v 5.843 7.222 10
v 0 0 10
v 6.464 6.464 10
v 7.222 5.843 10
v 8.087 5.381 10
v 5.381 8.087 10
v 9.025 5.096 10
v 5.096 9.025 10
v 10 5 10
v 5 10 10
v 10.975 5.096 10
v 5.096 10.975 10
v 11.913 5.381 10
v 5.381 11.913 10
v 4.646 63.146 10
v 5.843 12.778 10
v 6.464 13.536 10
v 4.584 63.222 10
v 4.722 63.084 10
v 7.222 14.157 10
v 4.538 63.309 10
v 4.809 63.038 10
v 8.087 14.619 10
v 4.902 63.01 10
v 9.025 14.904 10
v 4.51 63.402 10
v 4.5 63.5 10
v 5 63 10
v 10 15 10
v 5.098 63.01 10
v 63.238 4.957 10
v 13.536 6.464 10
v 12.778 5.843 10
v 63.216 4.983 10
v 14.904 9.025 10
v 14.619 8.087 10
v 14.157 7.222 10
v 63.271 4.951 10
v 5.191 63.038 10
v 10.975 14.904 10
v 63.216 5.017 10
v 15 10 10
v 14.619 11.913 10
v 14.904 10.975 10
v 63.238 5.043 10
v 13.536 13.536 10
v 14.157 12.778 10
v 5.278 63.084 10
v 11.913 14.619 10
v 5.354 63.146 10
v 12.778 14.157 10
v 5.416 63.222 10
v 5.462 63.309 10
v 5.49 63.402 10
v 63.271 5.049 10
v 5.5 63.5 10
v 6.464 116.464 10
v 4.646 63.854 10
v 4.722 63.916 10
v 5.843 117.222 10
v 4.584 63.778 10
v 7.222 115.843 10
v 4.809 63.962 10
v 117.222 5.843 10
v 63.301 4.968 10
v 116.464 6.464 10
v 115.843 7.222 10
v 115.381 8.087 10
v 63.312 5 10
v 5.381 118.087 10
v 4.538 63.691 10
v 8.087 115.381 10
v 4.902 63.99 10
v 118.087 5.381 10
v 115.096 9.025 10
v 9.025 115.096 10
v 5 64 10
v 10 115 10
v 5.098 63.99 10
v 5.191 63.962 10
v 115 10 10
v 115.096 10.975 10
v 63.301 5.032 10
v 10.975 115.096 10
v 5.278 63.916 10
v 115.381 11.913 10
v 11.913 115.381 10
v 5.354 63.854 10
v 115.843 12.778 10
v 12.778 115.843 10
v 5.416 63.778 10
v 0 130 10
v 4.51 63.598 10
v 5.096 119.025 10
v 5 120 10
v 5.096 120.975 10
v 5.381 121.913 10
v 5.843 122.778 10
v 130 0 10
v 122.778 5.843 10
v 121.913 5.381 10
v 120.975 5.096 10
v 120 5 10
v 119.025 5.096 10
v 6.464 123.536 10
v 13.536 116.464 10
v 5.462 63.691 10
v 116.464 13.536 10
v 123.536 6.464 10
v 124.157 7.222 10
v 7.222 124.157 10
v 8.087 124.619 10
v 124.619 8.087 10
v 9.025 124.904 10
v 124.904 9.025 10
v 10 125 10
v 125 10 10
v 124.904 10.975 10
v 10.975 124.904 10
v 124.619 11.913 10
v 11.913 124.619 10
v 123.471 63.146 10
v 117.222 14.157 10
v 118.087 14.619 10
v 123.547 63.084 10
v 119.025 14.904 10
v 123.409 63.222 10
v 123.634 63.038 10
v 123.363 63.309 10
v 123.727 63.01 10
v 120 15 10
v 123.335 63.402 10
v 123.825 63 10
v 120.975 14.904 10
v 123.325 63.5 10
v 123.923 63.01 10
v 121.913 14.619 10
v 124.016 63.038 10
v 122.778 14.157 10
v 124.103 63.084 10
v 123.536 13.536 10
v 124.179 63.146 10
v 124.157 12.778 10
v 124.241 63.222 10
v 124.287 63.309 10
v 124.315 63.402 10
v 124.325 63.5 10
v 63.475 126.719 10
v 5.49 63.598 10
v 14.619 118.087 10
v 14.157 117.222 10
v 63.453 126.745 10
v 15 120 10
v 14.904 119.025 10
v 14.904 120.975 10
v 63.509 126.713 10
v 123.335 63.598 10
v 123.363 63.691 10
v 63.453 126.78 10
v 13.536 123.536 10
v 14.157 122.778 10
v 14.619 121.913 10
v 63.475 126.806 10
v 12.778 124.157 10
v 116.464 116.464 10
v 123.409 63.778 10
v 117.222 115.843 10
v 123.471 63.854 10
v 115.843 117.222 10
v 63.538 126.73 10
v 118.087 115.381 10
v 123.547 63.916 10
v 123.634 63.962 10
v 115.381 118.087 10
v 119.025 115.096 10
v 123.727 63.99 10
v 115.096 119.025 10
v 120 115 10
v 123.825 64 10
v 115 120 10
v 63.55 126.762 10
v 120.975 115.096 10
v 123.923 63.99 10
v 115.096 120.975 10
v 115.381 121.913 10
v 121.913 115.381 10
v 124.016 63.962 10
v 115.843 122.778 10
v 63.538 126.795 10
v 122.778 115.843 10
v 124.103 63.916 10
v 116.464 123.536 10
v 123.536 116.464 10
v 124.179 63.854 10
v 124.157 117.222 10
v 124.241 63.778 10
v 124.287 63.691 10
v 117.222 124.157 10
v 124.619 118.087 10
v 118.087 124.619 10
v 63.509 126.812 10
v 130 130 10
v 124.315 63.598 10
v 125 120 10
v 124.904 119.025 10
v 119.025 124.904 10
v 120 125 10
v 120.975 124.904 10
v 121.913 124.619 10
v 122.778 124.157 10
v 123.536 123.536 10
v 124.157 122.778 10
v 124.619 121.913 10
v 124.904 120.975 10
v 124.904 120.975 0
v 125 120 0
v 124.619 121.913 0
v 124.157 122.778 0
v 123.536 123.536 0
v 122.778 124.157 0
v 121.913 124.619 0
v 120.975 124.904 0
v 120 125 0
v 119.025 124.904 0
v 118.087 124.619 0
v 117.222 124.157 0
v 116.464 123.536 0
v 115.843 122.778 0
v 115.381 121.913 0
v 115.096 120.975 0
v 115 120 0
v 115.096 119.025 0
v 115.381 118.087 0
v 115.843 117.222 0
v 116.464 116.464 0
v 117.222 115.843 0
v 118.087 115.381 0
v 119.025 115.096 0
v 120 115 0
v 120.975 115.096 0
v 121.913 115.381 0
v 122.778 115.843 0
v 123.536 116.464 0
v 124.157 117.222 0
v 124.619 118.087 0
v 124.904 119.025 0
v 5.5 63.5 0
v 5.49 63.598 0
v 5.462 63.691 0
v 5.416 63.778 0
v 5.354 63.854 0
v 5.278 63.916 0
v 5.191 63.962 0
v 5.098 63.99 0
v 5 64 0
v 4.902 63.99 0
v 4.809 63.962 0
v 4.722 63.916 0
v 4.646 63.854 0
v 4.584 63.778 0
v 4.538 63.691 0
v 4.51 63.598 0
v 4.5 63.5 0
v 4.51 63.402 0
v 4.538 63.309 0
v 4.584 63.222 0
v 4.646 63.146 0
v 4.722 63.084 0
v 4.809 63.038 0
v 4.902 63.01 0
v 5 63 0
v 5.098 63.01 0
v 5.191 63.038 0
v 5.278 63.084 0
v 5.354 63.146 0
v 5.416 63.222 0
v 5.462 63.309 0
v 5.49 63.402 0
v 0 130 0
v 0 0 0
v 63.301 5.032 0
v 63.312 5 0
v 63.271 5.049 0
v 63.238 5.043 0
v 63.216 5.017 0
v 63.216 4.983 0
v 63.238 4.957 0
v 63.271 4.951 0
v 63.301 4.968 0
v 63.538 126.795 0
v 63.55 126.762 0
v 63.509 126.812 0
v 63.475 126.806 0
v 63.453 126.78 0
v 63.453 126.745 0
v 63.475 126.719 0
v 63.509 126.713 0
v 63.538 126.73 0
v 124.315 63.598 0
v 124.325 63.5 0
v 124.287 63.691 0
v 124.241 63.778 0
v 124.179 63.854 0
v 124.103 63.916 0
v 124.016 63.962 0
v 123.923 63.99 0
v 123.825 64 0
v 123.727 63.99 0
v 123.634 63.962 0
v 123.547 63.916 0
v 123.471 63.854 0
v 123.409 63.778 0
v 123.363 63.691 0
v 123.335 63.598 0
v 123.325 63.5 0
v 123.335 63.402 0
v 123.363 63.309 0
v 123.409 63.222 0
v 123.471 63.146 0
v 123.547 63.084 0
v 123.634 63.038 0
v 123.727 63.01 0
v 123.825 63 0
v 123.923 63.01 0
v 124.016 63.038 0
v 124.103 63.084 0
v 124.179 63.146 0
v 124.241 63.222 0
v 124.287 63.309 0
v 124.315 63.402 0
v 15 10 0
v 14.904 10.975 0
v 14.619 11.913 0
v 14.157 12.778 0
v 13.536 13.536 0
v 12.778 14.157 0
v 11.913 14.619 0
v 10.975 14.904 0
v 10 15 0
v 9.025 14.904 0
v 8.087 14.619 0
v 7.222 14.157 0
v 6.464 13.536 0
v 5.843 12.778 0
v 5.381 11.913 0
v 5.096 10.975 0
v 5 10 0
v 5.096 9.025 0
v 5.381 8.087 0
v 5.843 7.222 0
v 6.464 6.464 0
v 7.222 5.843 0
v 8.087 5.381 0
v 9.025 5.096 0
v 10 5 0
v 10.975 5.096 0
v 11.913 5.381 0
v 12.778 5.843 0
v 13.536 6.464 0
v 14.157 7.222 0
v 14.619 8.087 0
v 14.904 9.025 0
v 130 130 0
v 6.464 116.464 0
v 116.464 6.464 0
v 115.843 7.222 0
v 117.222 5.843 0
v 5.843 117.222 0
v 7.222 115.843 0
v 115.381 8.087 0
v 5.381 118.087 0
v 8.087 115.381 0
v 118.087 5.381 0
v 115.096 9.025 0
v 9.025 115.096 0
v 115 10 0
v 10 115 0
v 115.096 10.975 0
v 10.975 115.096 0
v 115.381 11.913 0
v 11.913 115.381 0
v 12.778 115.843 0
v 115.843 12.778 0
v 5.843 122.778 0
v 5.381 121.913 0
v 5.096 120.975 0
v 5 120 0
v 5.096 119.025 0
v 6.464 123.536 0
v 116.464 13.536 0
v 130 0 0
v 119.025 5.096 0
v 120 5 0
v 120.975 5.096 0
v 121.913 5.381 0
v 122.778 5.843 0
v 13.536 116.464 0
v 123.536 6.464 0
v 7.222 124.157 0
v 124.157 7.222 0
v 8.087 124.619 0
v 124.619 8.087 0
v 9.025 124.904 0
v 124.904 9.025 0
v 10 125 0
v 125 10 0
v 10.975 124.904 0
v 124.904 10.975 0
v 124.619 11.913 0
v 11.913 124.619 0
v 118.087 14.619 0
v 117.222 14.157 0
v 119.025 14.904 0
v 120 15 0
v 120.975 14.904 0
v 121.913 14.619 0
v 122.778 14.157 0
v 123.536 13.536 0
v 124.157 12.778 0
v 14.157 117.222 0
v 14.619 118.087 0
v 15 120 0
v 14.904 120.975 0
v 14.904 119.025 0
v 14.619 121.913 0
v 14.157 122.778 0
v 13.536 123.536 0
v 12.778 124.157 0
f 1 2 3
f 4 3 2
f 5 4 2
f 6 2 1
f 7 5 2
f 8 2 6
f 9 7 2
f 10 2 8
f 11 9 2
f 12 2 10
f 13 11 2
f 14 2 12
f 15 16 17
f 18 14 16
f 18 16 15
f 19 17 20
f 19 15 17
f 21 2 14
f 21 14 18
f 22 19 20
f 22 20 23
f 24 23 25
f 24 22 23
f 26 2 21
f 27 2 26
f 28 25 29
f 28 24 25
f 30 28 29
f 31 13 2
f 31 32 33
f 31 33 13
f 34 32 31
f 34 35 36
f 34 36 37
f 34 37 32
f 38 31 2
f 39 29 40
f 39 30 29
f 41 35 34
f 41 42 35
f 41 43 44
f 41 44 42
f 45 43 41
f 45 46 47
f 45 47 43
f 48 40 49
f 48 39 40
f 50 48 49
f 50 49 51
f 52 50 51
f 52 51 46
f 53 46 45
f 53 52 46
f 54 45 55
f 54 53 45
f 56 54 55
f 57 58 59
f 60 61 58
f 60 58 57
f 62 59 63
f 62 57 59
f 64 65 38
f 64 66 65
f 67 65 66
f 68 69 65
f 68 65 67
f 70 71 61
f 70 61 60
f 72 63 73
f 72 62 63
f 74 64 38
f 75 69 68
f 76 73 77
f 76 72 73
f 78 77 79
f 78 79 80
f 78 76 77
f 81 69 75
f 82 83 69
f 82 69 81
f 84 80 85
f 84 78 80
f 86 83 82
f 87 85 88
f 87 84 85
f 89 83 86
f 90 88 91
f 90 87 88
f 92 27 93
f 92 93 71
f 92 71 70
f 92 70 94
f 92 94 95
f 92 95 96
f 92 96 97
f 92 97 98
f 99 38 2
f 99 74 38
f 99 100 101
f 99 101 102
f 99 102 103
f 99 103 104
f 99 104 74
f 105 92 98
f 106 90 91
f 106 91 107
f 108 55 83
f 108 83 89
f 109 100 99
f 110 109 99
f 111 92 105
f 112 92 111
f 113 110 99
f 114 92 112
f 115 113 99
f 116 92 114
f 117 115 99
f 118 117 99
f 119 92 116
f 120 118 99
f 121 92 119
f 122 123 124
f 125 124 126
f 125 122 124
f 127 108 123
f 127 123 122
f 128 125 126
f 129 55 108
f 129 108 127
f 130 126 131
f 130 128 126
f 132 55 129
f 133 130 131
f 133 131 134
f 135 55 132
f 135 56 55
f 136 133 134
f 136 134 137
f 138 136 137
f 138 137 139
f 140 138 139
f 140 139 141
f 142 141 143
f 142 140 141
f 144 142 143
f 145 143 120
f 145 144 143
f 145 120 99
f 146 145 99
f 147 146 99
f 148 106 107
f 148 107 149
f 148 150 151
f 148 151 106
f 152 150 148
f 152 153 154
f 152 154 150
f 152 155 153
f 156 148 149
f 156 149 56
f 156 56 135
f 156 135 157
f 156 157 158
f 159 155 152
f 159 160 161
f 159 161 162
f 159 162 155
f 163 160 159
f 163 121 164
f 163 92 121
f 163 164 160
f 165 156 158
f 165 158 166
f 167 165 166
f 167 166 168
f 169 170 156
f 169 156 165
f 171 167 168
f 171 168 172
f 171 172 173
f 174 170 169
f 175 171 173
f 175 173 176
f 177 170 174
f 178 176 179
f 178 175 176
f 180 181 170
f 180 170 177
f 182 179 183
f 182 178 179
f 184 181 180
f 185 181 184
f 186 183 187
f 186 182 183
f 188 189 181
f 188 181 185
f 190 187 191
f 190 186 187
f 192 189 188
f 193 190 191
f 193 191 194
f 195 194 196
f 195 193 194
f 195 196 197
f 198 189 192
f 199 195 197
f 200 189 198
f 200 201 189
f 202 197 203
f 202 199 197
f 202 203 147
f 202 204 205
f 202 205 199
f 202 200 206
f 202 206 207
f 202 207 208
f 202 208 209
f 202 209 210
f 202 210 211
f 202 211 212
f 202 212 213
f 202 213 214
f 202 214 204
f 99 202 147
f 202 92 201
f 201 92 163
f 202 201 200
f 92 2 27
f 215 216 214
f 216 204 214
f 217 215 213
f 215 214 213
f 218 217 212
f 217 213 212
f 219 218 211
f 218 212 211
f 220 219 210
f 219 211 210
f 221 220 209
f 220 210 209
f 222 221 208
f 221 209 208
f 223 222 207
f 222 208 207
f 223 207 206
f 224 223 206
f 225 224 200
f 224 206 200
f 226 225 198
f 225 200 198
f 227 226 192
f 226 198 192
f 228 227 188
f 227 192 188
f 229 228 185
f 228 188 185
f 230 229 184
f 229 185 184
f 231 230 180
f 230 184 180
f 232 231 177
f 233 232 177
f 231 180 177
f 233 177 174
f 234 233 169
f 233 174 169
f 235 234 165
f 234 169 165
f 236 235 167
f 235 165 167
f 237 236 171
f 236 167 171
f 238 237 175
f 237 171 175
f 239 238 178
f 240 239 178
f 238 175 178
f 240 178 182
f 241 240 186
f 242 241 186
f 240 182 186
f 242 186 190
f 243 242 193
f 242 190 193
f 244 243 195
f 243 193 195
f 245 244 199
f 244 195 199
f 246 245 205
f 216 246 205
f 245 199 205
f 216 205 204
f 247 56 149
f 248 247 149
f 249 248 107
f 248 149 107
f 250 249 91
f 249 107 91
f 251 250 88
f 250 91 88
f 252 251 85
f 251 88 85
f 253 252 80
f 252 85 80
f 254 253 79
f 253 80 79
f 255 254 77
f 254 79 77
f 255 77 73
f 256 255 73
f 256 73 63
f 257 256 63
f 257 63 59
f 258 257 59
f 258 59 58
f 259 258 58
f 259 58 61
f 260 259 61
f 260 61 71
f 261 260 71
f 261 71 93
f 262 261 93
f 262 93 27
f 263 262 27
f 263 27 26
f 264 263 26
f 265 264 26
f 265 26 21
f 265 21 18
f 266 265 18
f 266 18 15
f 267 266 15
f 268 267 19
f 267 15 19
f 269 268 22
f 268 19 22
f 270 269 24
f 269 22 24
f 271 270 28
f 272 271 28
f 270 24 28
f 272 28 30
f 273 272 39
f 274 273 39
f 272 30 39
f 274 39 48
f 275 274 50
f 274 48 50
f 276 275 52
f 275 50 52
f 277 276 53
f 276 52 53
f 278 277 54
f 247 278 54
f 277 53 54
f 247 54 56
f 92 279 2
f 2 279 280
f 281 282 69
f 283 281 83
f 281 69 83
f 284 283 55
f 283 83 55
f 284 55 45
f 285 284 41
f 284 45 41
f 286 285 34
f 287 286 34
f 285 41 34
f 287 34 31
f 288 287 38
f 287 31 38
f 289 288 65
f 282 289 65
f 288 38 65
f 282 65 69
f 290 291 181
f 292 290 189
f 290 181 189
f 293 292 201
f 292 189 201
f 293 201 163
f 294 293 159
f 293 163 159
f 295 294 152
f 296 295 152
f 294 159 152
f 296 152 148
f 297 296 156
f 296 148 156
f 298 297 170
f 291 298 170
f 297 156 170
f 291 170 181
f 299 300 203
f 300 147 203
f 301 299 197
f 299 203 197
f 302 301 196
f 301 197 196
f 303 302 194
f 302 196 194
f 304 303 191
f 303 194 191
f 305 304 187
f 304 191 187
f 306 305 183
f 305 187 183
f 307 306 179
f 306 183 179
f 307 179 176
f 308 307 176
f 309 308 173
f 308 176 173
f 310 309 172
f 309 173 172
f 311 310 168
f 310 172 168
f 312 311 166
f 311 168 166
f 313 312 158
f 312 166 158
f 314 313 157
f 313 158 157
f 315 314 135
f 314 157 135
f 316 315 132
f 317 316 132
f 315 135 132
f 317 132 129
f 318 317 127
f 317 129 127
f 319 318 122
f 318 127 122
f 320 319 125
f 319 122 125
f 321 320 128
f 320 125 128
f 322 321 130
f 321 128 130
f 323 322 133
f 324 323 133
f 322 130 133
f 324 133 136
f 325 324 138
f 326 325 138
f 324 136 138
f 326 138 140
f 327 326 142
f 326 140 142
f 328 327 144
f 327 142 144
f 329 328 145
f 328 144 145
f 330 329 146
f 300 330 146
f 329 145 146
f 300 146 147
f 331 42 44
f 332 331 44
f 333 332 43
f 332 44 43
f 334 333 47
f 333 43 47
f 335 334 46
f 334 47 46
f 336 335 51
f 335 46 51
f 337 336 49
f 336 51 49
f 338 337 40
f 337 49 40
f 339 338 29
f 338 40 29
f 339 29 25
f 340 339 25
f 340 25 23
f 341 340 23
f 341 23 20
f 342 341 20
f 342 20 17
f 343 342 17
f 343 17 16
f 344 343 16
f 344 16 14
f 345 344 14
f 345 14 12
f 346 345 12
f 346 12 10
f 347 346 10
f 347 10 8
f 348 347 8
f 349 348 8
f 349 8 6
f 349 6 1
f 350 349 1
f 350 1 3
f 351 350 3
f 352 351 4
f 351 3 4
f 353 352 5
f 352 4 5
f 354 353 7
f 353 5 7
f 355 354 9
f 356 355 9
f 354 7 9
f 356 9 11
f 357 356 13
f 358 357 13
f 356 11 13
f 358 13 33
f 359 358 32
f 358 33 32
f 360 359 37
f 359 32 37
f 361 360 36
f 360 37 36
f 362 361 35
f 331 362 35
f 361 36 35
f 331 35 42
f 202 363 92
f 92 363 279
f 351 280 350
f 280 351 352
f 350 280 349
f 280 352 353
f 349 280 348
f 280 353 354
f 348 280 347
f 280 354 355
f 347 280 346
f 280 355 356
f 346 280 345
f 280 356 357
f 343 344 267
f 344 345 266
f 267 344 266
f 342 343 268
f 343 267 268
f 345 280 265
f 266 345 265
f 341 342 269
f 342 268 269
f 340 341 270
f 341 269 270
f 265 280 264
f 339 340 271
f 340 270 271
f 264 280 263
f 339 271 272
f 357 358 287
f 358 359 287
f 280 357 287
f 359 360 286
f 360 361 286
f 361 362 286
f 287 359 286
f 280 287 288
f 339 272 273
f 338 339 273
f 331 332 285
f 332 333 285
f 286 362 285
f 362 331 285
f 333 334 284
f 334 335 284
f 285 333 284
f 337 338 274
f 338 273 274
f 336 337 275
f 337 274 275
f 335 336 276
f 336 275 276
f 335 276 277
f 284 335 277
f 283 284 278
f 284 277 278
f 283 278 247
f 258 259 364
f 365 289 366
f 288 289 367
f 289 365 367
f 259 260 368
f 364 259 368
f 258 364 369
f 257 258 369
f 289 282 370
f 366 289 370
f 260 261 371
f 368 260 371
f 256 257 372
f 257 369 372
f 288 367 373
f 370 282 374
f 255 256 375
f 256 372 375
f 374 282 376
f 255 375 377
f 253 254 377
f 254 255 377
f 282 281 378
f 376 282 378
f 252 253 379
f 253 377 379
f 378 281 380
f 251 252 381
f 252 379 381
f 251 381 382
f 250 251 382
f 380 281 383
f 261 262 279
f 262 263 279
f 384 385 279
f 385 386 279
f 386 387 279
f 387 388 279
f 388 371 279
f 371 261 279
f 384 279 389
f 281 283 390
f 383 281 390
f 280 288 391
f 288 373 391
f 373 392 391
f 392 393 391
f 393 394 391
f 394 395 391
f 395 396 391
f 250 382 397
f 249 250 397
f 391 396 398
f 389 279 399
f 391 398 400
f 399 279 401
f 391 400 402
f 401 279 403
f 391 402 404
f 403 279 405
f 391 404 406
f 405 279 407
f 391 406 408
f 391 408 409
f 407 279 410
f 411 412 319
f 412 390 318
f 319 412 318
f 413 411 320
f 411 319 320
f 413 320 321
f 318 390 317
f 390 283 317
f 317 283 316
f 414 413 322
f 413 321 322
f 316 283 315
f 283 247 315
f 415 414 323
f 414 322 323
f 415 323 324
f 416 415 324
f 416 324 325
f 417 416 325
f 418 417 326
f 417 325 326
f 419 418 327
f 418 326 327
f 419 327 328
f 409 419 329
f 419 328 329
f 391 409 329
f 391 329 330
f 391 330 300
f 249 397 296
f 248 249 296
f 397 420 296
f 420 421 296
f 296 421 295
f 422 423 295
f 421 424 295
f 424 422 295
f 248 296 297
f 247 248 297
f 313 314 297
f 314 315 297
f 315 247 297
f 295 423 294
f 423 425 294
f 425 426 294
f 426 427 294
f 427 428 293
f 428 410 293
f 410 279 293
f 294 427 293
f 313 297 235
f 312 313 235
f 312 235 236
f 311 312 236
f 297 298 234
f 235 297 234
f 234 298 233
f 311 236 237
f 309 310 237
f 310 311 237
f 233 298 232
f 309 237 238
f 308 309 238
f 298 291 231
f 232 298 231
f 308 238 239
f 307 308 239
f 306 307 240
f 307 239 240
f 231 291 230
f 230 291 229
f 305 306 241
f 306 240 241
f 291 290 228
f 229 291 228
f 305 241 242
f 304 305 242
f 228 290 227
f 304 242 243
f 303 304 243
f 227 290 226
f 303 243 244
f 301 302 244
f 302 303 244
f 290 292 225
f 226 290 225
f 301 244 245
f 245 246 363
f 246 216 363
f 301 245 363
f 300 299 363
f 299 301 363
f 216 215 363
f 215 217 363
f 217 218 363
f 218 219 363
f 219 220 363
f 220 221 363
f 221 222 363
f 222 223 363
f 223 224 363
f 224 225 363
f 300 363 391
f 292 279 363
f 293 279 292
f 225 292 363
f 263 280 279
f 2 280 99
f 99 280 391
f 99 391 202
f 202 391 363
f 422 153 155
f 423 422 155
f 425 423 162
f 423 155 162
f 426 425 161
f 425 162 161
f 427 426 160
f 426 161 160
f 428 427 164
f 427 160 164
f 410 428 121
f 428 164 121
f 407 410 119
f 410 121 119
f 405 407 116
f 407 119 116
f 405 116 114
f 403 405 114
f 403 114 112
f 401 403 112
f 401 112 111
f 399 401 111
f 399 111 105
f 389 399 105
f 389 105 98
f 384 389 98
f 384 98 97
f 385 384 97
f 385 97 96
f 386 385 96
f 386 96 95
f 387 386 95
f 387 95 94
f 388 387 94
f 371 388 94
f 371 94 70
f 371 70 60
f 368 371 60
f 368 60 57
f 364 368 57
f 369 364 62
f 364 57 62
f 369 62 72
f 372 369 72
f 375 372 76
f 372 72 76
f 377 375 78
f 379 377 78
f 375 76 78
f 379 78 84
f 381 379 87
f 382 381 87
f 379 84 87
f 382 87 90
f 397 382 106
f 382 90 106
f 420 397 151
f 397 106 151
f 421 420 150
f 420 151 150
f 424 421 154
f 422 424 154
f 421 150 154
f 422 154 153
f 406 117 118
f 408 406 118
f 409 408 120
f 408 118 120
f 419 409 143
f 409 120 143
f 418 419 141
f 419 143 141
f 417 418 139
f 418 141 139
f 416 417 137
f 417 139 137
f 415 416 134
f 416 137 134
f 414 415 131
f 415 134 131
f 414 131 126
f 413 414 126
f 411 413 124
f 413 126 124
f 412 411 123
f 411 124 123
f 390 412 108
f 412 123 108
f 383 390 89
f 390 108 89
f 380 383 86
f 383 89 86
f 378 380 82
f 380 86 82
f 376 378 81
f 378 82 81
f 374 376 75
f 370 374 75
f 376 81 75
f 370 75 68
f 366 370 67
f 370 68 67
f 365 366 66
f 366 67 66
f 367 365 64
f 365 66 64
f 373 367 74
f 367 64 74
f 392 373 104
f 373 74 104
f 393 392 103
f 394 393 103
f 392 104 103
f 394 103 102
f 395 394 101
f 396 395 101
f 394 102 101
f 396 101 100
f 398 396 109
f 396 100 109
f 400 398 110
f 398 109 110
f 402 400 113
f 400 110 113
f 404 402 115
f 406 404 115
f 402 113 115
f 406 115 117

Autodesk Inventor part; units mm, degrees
ref_plane "YZ Plane" through (0, 0, 0) normal (1, 0, 0) x (0, 1, 0)
ref_plane "XZ Plane" through (0, 0, 0) normal (0, 1, 0) x (-1, 0, 0)
ref_plane "XY Plane" through (0, 0, 0) normal (0, 0, 1) x (1, 0, 0)
sketch "Sketch1" plane through (0, 0, 0) normal (0, 0, 1) x (1, 0, 0)
  line L0 (0, 0) -> (130, 0)
  line L1 (130, 0) -> (130, 130)
  line L2 (130, 130) -> (0, 130)
  line L3 (0, 130) -> (0, 0)
  dimension "d0" = 130
  dimension "d1" = 130
extrude "Extrusion1" add sketch "Sketch1" along normal blind 10
sketch "Sketch2" plane through (0, 0, 10) normal (0, 0, 1) x (1, 0, 0)
  line L0 (0, 0) -> (130, 0) projected
  line L1 (0, 0) -> (10, 0)
  line L2 (10, 0) -> (10, 110)
  line L3 (10, 110) -> (10, 120)
  line L4 (10, 120) -> (120, 120)
  line L5 (120, 120) -> (120, 10)
  line L6 (120, 10) -> (10, 10)
  circle A0 centre (10, 120) radius 5
  circle A1 centre (120, 120) radius 5
  circle A2 centre (10, 10) radius 5
  circle A3 centre (120, 10) radius 5
  dimension "d4" = 10
  dimension "d5" = 110
  dimension "d6" = 10
  dimension "d7" = 110
  dimension "d8" = 110
  dimension "d9" = 110
  dimension "d10" = 10
  dimension "d11" = 10
  dimension "d12" = 10
  dimension "d13" = 10
extrude "Extrusion2" cut sketch "Sketch2" against normal through all contours A2 L2 | L2 L6 A2 | L2 A2 L6 | A3 L5 L6 | L6 L5 A3 | A0 L4 L3 | L3 L4 A0 | A1 L4 L5 | L5 L4 A1
sketch "Sketch3" plane through (0, 0, 10) normal (0, 0, 1) x (1, 0, 0)
  line L0 (0, 0) -> (130, 0) projected
  line L1 (68.2625, 0) -> (63.2625, 0)
  line L2 (63.2625, 0) -> (63.2625, 5)
  circle A0 centre (63.2625, 5) radius 0.05
  dimension "d16" = 5
  dimension "d17" = 5
  dimension "d18" = 0.1
extrude "Extrusion3" cut sketch "Sketch3" along normal through all both and the other way through all
sketch "Sketch4" plane through (0, 0, 10) normal (0, 0, 1) x (1, 0, 0)
  line L0 (63.5, 131.7625) -> (63.5, 126.7625)
  circle A0 centre (63.5, 126.7625) radius 0.05
  point P0 (0, 0)
  dimension "d21" = 5
  dimension "d22" = 0.1
extrude "Extrusion4" cut sketch "Sketch4" against normal blind 10
sketch "Sketch5" plane through (0, 0, 10) normal (0, 0, 1) x (1, 0, 0)
  line L0 (0, 63.5) -> (5, 63.5)
  line L1 (5, 63.5) -> (123.825, 63.5)
  circle A0 centre (5, 63.5) radius 0.5
  circle A1 centre (123.825, 63.5) radius 0.5
  point P0 (0, 0)
  dimension "d25" = 5
  dimension "d26" = 1
  dimension "d27" = 1
extrude "Extrusion5" cut sketch "Sketch5" against normal through all
sketch "Sketch6" plane through (0, 0, 10) normal (0, 0, 1) x (1, 0, 0)
  point P0 (0, 0)
properties part number "STAND PLATE FOR STORSGE SYSTEM"
